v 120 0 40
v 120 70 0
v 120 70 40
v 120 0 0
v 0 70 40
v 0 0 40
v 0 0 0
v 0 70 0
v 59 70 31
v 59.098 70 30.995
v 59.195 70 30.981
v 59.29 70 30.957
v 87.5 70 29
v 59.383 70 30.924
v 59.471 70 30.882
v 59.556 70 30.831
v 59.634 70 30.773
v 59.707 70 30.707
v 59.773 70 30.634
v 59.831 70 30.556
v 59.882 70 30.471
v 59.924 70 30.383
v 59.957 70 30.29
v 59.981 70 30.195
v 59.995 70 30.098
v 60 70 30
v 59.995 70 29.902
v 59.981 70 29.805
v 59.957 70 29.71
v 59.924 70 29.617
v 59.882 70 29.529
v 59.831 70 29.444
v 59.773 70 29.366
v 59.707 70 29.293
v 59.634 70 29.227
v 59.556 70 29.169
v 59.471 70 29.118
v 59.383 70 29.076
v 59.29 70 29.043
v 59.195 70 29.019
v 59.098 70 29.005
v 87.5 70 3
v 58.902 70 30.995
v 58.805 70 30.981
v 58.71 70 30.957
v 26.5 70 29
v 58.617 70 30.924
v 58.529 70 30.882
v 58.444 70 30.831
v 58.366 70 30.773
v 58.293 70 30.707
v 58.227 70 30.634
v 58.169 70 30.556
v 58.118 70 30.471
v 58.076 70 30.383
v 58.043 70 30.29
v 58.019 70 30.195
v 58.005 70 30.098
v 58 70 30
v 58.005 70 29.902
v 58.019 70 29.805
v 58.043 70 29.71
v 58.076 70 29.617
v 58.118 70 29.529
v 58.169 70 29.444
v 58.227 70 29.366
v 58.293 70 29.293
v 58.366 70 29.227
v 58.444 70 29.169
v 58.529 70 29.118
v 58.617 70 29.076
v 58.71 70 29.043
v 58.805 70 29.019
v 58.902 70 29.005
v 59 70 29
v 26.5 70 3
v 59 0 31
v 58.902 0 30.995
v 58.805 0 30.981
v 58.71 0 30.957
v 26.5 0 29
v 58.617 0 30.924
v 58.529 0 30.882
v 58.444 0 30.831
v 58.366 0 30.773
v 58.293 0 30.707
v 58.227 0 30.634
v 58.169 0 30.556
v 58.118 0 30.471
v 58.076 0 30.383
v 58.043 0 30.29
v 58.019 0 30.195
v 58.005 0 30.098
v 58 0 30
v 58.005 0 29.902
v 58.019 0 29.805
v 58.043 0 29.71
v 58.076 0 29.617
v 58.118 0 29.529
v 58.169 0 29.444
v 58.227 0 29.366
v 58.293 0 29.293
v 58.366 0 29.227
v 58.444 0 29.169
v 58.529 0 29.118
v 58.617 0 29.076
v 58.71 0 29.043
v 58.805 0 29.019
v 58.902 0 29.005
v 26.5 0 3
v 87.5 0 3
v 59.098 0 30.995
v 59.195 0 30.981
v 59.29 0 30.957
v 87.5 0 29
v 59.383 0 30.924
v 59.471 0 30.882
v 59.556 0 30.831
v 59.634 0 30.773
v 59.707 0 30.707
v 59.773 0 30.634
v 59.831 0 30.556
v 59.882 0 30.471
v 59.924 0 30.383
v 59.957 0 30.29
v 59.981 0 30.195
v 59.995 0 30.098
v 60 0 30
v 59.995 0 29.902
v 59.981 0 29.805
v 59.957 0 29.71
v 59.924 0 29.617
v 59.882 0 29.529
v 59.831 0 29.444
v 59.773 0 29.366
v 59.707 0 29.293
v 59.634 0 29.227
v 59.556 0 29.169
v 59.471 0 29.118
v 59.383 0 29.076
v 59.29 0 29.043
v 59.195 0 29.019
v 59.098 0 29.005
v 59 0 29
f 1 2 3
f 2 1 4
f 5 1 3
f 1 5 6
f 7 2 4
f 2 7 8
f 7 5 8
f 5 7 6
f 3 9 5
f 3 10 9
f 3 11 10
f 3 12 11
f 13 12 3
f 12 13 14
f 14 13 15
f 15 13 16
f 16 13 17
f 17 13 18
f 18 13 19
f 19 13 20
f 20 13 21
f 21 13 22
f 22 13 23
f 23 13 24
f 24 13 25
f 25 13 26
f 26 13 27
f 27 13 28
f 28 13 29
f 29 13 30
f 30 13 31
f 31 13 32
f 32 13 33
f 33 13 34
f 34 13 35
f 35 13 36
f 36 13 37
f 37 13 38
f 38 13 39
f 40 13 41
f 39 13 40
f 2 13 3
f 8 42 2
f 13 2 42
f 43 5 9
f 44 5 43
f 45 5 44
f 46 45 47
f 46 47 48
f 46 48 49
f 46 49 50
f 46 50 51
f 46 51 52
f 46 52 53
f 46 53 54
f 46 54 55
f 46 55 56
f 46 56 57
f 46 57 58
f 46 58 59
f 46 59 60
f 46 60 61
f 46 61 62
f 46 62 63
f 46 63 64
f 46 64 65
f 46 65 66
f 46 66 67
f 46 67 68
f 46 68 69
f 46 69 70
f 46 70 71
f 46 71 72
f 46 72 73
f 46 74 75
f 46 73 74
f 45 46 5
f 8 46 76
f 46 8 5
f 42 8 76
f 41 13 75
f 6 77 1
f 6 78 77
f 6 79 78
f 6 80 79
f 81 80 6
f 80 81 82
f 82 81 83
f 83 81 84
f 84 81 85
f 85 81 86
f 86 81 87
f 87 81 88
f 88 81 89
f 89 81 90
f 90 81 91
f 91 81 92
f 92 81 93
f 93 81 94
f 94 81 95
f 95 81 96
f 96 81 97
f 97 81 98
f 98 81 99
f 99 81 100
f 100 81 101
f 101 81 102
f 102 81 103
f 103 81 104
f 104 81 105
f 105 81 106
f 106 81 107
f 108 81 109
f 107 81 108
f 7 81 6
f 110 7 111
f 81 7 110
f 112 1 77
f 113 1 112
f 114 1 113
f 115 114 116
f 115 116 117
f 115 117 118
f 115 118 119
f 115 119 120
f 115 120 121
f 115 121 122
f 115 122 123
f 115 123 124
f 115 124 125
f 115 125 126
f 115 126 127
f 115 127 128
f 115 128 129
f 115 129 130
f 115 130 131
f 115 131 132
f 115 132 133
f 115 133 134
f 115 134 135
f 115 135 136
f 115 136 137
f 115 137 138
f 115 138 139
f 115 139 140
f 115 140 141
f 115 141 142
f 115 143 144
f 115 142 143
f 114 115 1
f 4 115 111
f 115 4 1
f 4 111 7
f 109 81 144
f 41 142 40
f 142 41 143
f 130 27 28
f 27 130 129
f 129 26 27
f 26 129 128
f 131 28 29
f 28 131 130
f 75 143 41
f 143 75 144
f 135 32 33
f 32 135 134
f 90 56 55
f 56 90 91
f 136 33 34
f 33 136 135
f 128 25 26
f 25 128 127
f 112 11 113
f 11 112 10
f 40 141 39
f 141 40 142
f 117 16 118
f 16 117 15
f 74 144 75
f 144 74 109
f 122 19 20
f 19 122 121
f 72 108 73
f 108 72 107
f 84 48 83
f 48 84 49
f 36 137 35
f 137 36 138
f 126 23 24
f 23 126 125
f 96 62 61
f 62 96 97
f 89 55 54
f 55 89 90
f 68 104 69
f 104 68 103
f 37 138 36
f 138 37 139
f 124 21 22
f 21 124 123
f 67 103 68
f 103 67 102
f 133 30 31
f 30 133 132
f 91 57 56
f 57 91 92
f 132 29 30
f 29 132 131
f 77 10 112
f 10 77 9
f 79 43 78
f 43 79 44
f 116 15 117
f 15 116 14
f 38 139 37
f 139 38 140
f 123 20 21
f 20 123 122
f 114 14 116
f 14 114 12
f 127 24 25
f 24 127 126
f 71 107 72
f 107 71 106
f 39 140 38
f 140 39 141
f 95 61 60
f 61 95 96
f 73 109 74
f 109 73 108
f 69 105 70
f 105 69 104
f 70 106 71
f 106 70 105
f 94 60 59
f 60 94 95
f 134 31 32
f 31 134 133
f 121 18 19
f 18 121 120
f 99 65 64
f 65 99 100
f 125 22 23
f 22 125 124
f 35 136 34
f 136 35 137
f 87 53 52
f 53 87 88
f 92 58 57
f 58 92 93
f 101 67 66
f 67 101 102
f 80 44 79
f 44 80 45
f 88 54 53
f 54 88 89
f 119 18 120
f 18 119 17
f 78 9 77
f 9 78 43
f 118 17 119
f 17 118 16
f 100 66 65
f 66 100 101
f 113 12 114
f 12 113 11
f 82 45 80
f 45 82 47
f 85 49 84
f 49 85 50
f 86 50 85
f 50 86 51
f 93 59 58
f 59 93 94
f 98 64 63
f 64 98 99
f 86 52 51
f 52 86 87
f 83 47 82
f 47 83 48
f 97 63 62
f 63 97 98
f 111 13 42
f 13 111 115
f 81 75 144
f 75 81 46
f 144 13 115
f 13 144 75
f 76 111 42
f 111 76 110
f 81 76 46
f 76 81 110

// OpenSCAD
// Buffer tank for mini horizontal gel-electrophoresis box
// Units: mm. Print orientation: open top, resting on XY plane at z = 0.

$fn = 64;

// ---- Tank ----
outer_x      = 120;   // tank outer length (X)
outer_y      = 70;    // tank outer width (Y)
tank_h       = 40;    // tank outer height (Z)
wall         = 3;     // tank wall thickness
floor_t      = 3;     // tank floor thickness

// ---- Gel-tray platform ----
plat_x       = 60;    // platform length in X (centred)
plat_y       = 70;    // platform width in Y (full inner width)
plat_top_z   = 10;    // platform top height above inner floor

// ---- Electrode holes ----
hole_d       = 2;     // electrode hole diameter
hole_y       = 0;     // electrode hole Y position
hole_z       = 30;    // electrode hole Z position

// ---- Misc ----
eps          = 0.5;   // cutter overshoot past faces

// Inner dimensions
inner_x = outer_x - 2*wall;
inner_z = tank_h - floor_t;

// Platform legs (simplified) extending from top down to the floor
leg_h = plat_top_z + floor_t;

difference() {
    union() {
        // Tank body
        cube([outer_x, outer_y, tank_h]);
        // Raised platform
        translate([(outer_x - plat_x)/2, 0, plat_top_z])
            cube([plat_x, plat_y, leg_h]);
    }

    // Chamber divider: runs along Y, sits on top of the floor,
    // leaving an open gap above the platform so the chambers connect.
    translate([(inner_x - plat_x)/2 - eps, 0, floor_t])
        cube([plat_x + 2*eps, outer_y, inner_z - plat_top_z - 1]);

    // Electrode wires: horizontal holes along X through each end wall
    for (s = [-1, 1])
        translate([s * (outer_x/2 - hole_d/2), hole_y, hole_z])
            rotate([-90, 0, 0]) cylinder(d = hole_d, h = outer_x + 2*eps);
}
